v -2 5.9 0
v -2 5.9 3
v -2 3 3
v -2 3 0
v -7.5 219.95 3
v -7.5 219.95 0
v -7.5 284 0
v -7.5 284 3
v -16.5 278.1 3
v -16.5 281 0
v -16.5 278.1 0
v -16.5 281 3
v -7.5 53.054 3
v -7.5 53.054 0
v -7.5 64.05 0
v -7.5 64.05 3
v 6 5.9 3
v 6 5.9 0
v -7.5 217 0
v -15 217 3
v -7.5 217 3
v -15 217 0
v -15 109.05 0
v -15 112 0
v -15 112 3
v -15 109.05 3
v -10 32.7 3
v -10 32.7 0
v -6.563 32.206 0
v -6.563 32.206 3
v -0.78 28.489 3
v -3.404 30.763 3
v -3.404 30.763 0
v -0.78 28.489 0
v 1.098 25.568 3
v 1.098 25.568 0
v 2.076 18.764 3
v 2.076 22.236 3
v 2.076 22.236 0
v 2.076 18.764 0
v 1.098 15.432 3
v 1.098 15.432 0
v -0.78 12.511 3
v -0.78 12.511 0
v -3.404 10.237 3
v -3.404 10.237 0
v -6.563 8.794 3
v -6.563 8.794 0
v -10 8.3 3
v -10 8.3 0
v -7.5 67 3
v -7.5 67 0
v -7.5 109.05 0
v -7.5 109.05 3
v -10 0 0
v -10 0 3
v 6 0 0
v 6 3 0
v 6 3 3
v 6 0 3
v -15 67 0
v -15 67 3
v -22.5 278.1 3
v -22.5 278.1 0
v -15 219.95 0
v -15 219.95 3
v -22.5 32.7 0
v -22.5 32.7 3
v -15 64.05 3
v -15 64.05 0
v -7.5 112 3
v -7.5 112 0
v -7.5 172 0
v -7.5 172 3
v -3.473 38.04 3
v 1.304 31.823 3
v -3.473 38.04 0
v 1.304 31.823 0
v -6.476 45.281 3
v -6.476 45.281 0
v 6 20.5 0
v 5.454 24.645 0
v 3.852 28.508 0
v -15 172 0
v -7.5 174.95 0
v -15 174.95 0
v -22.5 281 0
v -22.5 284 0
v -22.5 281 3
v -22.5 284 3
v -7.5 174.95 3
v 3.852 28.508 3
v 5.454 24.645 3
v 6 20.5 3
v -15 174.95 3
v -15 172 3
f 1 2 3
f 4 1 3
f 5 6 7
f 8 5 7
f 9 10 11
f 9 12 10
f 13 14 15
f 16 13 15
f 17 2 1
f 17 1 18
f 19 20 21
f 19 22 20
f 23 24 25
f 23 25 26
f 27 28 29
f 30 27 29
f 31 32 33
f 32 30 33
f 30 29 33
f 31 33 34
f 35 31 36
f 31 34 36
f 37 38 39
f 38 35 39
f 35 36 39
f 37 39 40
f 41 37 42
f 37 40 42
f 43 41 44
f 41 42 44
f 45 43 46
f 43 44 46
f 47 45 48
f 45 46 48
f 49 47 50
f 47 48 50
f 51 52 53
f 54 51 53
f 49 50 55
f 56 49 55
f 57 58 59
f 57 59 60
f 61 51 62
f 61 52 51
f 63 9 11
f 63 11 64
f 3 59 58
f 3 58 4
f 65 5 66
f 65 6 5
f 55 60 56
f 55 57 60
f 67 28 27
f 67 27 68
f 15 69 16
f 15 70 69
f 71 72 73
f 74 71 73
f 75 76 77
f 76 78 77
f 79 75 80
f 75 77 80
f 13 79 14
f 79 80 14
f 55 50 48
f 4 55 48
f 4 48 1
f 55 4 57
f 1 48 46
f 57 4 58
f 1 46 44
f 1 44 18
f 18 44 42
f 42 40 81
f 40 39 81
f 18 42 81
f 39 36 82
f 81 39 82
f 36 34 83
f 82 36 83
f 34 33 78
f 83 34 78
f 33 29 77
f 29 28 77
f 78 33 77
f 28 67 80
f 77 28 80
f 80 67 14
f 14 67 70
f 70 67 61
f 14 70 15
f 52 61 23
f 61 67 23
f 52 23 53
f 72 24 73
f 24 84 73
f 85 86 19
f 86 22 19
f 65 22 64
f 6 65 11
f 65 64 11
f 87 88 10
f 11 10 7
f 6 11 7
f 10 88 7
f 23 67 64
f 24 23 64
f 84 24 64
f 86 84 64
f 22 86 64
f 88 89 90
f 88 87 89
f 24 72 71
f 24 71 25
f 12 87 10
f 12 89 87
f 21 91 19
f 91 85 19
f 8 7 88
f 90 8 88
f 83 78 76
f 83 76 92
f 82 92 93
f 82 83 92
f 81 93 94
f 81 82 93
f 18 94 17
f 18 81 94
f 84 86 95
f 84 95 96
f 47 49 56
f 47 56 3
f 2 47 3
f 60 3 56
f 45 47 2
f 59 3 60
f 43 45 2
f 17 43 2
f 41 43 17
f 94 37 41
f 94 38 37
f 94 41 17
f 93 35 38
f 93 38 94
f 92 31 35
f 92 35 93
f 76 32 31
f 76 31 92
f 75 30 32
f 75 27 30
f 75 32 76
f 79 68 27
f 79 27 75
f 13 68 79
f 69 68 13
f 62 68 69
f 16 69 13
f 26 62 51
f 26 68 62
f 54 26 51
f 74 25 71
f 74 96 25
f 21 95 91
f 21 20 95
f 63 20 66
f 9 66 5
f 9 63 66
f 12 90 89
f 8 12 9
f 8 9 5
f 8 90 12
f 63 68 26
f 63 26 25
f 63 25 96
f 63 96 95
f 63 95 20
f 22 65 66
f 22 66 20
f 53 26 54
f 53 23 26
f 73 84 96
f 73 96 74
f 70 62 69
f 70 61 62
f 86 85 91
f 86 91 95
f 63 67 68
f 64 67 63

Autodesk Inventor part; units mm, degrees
ref_plane "YZ Plane" through (0, 0, 0) normal (1, 0, 0) x (0, 1, 0)
ref_plane "XZ Plane" through (0, 0, 0) normal (0, 1, 0) x (-1, 0, 0)
ref_plane "XY Plane" through (0, 0, 0) normal (0, 0, 1) x (1, 0, 0)
sketch "草圖1" plane through (0, 0, 0) normal (0, 0, 1) x (1, 0, 0)
  arc A0 (-7.5, 147.4544) -> (-7.5, 136.5456) centre (-10, 142) ccw construction
  arc A1 (-10, 4.5) -> (1.3043, 31.8231) centre (-10, 20.5) ccw
  line L0 (-10, 20.5) -> (-10, 4.5) construction
  line L1 (-10, 20.5) -> (-10, 48.1702) construction
  line L2 (-10, 8.3) -> (-10, 4.5)
  line L3 (-7.5, 284) -> (-22.5, 284)
  line L4 (-22.5, 284) -> (-22.5, 48.1702)
  line L5 (-22.5, 48.1702) -> (-10, 48.1702) construction
  line L6 (-7.5, 36.5) -> (-7.5, 53.0538) construction
  line L7 (-7.5, 36.5) -> (-7.5, 36.3035) construction
  line L8 (-10, 48.1702) -> (-10, 32.7) construction
  line L9 (-10, 32.7) -> (-22.5, 32.7)
  line L10 (-22.5, 32.7) -> (-22.5, 48.1702)
  arc A2 (-7.5, 53.0538) -> (1.3043, 31.8231) centre (22.5, 53.0538) ccw
  arc A3 (1.3043, 31.8231) -> (-7.5, 36.3035) centre (-10, 20.5) ccw construction
  line L11 (-7.5, 53.0538) -> (-7.5, 64.05)
  line L12 (-7.5, 219.95) -> (-15, 219.95)
  line L13 (-15, 219.95) -> (-15, 217)
  line L14 (-15, 217) -> (-7.5, 217)
  line L15 (-7.5, 217) -> (-7.5, 219.95) construction
  line L16 (-7.5, 174.95) -> (-15, 174.95)
  line L17 (-15, 174.95) -> (-15, 172)
  line L18 (-15, 172) -> (-7.5, 172)
  line L19 (-7.5, 172) -> (-7.5, 174.95) construction
  line L20 (-7.5, 112) -> (-15, 112)
  line L21 (-15, 112) -> (-15, 109.05)
  line L22 (-15, 109.05) -> (-7.5, 109.05)
  line L23 (-7.5, 109.05) -> (-7.5, 112) construction
  line L24 (-7.5, 67) -> (-15, 67)
  line L25 (-15, 67) -> (-15, 64.05)
  line L26 (-15, 64.05) -> (-7.5, 64.05)
  line L27 (-7.5, 64.05) -> (-7.5, 67) construction
  line L28 (-7.5, 217) -> (-7.5, 219.95) construction
  line L29 (-7.5, 174.95) -> (-7.5, 217)
  line L30 (-7.5, 172) -> (-7.5, 174.95) construction
  line L31 (-7.5, 112) -> (-7.5, 172)
  line L32 (-7.5, 109.05) -> (-7.5, 112) construction
  line L33 (-7.5, 67) -> (-7.5, 109.05)
  line L34 (-7.5, 64.05) -> (-7.5, 67) construction
  line L35 (-7.5, 219.95) -> (-7.5, 284)
  arc A4 (-10, 8.3) -> (-10, 32.7) centre (-10, 20.5) ccw
  arc A5 (-12.7221, 32.7) -> (-10, 8) centre (-10, 20.5) ccw construction
  line L36 (-10, 4.5) -> (6, 4.5)
  line L37 (6, 4.5) -> (6, 0)
  line L38 (6, 0) -> (-10, 0)
  line L39 (-10, 0) -> (-10, 4.5)
  line L40 (6, 4.5) -> (6, 20.5)
  point P0 (0, 0)
  dimension "d12" = 16
  dimension "d13" = 180
  dimension "d14" = 15
  dimension "d16" = 60
  dimension "d17" = 30
  dimension "d18" = 75
  dimension "d19" = 30
  dimension "d20" = 75
  dimension "d21" = 2.95
  dimension "d22" = 2.95
  dimension "d23" = 2.95
  dimension "d24" = 2.95
  dimension "d25" = 7.5
  dimension "d30" = 24.4
  dimension "d31" = 25
  dimension "d32" = 4.5
  dimension "d38" = 284
extrude "擠出1" add sketch "草圖1" along normal blind 3
sketch "草圖3" plane through (0, 0, 3) normal (0, 0, 1) x (1, 0, 0)
  line L0 (-10, 8.3) -> (-10, 0) projected
  line L1 (-10, 5.9) -> (-2, 5.9)
  line L2 (-2, 5.9) -> (-2, 3)
  line L3 (-2, 3) -> (-10, 3)
  line L4 (-10, 3) -> (-10, 5.9)
  line L5 (-10, 0) -> (6, 0) projected
  line L6 (-2, 5.9) -> (6, 5.9)
  line L7 (6, 5.9) -> (6, 3)
  line L8 (6, 3) -> (-2, 3)
  line L9 (-2, 3) -> (-2, 5.9)
  line L10 (6, 0) -> (6, 20.5) projected
  point P0 (0, 0)
  dimension "d33" = 2.9
  dimension "d34" = 3
  dimension "d39" = 8
extrude "擠出2" cut sketch "草圖3" against normal up to surface (3 mm away) contours L6 L7 L8 L2
sketch "草圖4" plane through (0, 0, 3) normal (0, 0, 1) x (1, 0, 0)
  line L0 (-22.5, 284) -> (-22.5, 32.7) projected
  line L1 (-22.5, 281) -> (-16.5, 281)
  line L2 (-16.5, 281) -> (-16.5, 278.1)
  line L3 (-16.5, 278.1) -> (-22.5, 278.1)
  line L4 (-22.5, 278.1) -> (-22.5, 281)
  line L5 (-7.5, 284) -> (-22.5, 284) projected
  point P0 (0, 0)
  dimension "d40" = 3
  dimension "d41" = 2.9
  dimension "d42" = 6
extrude "擠出3" cut sketch "草圖4" against normal up to surface (3 mm away)
sketch "草圖5" plane through (0, 0, 3) normal (0, 0, 1) x (1, 0, 0)
  line L0 (-16.5, 278.1) -> (-22.5, 278.1) projected
  line L1 (-22.5, 278.1) -> (-22.5, 32.7) projected
  line L2 (-22.5, 32.7) -> (-10, 32.7) projected
  arc A0 (-10, 8.3) -> (-10, 32.7) centre (-10, 20.5) ccw projected
  line L3 (-10, 8.3) -> (-10, 0) projected
  line L4 (-10, 0) -> (6, 0) projected
  line L5 (6, 0) -> (6, 3) projected
  line L6 (6, 3) -> (-2, 3) projected
  line L7 (-2, 3) -> (-2, 5.9) projected
  line L8 (-2, 5.9) -> (6, 5.9) projected
  line L9 (6, 5.9) -> (6, 20.5) projected
  arc A1 (6, 20.5) -> (1.3043, 31.8231) centre (-10, 20.5) ccw projected
  arc A2 (-7.5, 53.0538) -> (1.3043, 31.8231) centre (22.5, 53.0538) ccw projected
  line L10 (-7.5, 53.0538) -> (-7.5, 64.05) projected
  line L11 (-7.5, 64.05) -> (-15, 64.05) projected
  line L12 (-15, 64.05) -> (-15, 67) projected
  line L13 (-15, 67) -> (-7.5, 67) projected
  line L14 (-7.5, 67) -> (-7.5, 109.05) projected
  line L15 (-7.5, 109.05) -> (-15, 109.05) projected
  line L16 (-15, 109.05) -> (-15, 112) projected
  line L17 (-15, 112) -> (-7.5, 112) projected
  line L18 (-7.5, 112) -> (-7.5, 172) projected
  line L19 (-7.5, 172) -> (-15, 172) projected
  line L20 (-15, 172) -> (-15, 174.95) projected
  line L21 (-15, 174.95) -> (-7.5, 174.95) projected
  line L22 (-7.5, 174.95) -> (-7.5, 217) projected
  line L23 (-7.5, 217) -> (-15, 217) projected
  line L24 (-15, 217) -> (-15, 219.95) projected
  line L25 (-15, 219.95) -> (-7.5, 219.95) projected
  line L26 (-7.5, 219.95) -> (-7.5, 284) projected
  line L27 (-7.5, 284) -> (-22.5, 284) projected
  line L28 (-22.5, 284) -> (-22.5, 281) projected
  line L29 (-22.5, 281) -> (-16.5, 281) projected
  line L30 (-16.5, 281) -> (-16.5, 278.1) projected
  point P0 (0, 0)
equation "\"d25\" = 0.5 * d14"
properties part number "chassis_1_5"
